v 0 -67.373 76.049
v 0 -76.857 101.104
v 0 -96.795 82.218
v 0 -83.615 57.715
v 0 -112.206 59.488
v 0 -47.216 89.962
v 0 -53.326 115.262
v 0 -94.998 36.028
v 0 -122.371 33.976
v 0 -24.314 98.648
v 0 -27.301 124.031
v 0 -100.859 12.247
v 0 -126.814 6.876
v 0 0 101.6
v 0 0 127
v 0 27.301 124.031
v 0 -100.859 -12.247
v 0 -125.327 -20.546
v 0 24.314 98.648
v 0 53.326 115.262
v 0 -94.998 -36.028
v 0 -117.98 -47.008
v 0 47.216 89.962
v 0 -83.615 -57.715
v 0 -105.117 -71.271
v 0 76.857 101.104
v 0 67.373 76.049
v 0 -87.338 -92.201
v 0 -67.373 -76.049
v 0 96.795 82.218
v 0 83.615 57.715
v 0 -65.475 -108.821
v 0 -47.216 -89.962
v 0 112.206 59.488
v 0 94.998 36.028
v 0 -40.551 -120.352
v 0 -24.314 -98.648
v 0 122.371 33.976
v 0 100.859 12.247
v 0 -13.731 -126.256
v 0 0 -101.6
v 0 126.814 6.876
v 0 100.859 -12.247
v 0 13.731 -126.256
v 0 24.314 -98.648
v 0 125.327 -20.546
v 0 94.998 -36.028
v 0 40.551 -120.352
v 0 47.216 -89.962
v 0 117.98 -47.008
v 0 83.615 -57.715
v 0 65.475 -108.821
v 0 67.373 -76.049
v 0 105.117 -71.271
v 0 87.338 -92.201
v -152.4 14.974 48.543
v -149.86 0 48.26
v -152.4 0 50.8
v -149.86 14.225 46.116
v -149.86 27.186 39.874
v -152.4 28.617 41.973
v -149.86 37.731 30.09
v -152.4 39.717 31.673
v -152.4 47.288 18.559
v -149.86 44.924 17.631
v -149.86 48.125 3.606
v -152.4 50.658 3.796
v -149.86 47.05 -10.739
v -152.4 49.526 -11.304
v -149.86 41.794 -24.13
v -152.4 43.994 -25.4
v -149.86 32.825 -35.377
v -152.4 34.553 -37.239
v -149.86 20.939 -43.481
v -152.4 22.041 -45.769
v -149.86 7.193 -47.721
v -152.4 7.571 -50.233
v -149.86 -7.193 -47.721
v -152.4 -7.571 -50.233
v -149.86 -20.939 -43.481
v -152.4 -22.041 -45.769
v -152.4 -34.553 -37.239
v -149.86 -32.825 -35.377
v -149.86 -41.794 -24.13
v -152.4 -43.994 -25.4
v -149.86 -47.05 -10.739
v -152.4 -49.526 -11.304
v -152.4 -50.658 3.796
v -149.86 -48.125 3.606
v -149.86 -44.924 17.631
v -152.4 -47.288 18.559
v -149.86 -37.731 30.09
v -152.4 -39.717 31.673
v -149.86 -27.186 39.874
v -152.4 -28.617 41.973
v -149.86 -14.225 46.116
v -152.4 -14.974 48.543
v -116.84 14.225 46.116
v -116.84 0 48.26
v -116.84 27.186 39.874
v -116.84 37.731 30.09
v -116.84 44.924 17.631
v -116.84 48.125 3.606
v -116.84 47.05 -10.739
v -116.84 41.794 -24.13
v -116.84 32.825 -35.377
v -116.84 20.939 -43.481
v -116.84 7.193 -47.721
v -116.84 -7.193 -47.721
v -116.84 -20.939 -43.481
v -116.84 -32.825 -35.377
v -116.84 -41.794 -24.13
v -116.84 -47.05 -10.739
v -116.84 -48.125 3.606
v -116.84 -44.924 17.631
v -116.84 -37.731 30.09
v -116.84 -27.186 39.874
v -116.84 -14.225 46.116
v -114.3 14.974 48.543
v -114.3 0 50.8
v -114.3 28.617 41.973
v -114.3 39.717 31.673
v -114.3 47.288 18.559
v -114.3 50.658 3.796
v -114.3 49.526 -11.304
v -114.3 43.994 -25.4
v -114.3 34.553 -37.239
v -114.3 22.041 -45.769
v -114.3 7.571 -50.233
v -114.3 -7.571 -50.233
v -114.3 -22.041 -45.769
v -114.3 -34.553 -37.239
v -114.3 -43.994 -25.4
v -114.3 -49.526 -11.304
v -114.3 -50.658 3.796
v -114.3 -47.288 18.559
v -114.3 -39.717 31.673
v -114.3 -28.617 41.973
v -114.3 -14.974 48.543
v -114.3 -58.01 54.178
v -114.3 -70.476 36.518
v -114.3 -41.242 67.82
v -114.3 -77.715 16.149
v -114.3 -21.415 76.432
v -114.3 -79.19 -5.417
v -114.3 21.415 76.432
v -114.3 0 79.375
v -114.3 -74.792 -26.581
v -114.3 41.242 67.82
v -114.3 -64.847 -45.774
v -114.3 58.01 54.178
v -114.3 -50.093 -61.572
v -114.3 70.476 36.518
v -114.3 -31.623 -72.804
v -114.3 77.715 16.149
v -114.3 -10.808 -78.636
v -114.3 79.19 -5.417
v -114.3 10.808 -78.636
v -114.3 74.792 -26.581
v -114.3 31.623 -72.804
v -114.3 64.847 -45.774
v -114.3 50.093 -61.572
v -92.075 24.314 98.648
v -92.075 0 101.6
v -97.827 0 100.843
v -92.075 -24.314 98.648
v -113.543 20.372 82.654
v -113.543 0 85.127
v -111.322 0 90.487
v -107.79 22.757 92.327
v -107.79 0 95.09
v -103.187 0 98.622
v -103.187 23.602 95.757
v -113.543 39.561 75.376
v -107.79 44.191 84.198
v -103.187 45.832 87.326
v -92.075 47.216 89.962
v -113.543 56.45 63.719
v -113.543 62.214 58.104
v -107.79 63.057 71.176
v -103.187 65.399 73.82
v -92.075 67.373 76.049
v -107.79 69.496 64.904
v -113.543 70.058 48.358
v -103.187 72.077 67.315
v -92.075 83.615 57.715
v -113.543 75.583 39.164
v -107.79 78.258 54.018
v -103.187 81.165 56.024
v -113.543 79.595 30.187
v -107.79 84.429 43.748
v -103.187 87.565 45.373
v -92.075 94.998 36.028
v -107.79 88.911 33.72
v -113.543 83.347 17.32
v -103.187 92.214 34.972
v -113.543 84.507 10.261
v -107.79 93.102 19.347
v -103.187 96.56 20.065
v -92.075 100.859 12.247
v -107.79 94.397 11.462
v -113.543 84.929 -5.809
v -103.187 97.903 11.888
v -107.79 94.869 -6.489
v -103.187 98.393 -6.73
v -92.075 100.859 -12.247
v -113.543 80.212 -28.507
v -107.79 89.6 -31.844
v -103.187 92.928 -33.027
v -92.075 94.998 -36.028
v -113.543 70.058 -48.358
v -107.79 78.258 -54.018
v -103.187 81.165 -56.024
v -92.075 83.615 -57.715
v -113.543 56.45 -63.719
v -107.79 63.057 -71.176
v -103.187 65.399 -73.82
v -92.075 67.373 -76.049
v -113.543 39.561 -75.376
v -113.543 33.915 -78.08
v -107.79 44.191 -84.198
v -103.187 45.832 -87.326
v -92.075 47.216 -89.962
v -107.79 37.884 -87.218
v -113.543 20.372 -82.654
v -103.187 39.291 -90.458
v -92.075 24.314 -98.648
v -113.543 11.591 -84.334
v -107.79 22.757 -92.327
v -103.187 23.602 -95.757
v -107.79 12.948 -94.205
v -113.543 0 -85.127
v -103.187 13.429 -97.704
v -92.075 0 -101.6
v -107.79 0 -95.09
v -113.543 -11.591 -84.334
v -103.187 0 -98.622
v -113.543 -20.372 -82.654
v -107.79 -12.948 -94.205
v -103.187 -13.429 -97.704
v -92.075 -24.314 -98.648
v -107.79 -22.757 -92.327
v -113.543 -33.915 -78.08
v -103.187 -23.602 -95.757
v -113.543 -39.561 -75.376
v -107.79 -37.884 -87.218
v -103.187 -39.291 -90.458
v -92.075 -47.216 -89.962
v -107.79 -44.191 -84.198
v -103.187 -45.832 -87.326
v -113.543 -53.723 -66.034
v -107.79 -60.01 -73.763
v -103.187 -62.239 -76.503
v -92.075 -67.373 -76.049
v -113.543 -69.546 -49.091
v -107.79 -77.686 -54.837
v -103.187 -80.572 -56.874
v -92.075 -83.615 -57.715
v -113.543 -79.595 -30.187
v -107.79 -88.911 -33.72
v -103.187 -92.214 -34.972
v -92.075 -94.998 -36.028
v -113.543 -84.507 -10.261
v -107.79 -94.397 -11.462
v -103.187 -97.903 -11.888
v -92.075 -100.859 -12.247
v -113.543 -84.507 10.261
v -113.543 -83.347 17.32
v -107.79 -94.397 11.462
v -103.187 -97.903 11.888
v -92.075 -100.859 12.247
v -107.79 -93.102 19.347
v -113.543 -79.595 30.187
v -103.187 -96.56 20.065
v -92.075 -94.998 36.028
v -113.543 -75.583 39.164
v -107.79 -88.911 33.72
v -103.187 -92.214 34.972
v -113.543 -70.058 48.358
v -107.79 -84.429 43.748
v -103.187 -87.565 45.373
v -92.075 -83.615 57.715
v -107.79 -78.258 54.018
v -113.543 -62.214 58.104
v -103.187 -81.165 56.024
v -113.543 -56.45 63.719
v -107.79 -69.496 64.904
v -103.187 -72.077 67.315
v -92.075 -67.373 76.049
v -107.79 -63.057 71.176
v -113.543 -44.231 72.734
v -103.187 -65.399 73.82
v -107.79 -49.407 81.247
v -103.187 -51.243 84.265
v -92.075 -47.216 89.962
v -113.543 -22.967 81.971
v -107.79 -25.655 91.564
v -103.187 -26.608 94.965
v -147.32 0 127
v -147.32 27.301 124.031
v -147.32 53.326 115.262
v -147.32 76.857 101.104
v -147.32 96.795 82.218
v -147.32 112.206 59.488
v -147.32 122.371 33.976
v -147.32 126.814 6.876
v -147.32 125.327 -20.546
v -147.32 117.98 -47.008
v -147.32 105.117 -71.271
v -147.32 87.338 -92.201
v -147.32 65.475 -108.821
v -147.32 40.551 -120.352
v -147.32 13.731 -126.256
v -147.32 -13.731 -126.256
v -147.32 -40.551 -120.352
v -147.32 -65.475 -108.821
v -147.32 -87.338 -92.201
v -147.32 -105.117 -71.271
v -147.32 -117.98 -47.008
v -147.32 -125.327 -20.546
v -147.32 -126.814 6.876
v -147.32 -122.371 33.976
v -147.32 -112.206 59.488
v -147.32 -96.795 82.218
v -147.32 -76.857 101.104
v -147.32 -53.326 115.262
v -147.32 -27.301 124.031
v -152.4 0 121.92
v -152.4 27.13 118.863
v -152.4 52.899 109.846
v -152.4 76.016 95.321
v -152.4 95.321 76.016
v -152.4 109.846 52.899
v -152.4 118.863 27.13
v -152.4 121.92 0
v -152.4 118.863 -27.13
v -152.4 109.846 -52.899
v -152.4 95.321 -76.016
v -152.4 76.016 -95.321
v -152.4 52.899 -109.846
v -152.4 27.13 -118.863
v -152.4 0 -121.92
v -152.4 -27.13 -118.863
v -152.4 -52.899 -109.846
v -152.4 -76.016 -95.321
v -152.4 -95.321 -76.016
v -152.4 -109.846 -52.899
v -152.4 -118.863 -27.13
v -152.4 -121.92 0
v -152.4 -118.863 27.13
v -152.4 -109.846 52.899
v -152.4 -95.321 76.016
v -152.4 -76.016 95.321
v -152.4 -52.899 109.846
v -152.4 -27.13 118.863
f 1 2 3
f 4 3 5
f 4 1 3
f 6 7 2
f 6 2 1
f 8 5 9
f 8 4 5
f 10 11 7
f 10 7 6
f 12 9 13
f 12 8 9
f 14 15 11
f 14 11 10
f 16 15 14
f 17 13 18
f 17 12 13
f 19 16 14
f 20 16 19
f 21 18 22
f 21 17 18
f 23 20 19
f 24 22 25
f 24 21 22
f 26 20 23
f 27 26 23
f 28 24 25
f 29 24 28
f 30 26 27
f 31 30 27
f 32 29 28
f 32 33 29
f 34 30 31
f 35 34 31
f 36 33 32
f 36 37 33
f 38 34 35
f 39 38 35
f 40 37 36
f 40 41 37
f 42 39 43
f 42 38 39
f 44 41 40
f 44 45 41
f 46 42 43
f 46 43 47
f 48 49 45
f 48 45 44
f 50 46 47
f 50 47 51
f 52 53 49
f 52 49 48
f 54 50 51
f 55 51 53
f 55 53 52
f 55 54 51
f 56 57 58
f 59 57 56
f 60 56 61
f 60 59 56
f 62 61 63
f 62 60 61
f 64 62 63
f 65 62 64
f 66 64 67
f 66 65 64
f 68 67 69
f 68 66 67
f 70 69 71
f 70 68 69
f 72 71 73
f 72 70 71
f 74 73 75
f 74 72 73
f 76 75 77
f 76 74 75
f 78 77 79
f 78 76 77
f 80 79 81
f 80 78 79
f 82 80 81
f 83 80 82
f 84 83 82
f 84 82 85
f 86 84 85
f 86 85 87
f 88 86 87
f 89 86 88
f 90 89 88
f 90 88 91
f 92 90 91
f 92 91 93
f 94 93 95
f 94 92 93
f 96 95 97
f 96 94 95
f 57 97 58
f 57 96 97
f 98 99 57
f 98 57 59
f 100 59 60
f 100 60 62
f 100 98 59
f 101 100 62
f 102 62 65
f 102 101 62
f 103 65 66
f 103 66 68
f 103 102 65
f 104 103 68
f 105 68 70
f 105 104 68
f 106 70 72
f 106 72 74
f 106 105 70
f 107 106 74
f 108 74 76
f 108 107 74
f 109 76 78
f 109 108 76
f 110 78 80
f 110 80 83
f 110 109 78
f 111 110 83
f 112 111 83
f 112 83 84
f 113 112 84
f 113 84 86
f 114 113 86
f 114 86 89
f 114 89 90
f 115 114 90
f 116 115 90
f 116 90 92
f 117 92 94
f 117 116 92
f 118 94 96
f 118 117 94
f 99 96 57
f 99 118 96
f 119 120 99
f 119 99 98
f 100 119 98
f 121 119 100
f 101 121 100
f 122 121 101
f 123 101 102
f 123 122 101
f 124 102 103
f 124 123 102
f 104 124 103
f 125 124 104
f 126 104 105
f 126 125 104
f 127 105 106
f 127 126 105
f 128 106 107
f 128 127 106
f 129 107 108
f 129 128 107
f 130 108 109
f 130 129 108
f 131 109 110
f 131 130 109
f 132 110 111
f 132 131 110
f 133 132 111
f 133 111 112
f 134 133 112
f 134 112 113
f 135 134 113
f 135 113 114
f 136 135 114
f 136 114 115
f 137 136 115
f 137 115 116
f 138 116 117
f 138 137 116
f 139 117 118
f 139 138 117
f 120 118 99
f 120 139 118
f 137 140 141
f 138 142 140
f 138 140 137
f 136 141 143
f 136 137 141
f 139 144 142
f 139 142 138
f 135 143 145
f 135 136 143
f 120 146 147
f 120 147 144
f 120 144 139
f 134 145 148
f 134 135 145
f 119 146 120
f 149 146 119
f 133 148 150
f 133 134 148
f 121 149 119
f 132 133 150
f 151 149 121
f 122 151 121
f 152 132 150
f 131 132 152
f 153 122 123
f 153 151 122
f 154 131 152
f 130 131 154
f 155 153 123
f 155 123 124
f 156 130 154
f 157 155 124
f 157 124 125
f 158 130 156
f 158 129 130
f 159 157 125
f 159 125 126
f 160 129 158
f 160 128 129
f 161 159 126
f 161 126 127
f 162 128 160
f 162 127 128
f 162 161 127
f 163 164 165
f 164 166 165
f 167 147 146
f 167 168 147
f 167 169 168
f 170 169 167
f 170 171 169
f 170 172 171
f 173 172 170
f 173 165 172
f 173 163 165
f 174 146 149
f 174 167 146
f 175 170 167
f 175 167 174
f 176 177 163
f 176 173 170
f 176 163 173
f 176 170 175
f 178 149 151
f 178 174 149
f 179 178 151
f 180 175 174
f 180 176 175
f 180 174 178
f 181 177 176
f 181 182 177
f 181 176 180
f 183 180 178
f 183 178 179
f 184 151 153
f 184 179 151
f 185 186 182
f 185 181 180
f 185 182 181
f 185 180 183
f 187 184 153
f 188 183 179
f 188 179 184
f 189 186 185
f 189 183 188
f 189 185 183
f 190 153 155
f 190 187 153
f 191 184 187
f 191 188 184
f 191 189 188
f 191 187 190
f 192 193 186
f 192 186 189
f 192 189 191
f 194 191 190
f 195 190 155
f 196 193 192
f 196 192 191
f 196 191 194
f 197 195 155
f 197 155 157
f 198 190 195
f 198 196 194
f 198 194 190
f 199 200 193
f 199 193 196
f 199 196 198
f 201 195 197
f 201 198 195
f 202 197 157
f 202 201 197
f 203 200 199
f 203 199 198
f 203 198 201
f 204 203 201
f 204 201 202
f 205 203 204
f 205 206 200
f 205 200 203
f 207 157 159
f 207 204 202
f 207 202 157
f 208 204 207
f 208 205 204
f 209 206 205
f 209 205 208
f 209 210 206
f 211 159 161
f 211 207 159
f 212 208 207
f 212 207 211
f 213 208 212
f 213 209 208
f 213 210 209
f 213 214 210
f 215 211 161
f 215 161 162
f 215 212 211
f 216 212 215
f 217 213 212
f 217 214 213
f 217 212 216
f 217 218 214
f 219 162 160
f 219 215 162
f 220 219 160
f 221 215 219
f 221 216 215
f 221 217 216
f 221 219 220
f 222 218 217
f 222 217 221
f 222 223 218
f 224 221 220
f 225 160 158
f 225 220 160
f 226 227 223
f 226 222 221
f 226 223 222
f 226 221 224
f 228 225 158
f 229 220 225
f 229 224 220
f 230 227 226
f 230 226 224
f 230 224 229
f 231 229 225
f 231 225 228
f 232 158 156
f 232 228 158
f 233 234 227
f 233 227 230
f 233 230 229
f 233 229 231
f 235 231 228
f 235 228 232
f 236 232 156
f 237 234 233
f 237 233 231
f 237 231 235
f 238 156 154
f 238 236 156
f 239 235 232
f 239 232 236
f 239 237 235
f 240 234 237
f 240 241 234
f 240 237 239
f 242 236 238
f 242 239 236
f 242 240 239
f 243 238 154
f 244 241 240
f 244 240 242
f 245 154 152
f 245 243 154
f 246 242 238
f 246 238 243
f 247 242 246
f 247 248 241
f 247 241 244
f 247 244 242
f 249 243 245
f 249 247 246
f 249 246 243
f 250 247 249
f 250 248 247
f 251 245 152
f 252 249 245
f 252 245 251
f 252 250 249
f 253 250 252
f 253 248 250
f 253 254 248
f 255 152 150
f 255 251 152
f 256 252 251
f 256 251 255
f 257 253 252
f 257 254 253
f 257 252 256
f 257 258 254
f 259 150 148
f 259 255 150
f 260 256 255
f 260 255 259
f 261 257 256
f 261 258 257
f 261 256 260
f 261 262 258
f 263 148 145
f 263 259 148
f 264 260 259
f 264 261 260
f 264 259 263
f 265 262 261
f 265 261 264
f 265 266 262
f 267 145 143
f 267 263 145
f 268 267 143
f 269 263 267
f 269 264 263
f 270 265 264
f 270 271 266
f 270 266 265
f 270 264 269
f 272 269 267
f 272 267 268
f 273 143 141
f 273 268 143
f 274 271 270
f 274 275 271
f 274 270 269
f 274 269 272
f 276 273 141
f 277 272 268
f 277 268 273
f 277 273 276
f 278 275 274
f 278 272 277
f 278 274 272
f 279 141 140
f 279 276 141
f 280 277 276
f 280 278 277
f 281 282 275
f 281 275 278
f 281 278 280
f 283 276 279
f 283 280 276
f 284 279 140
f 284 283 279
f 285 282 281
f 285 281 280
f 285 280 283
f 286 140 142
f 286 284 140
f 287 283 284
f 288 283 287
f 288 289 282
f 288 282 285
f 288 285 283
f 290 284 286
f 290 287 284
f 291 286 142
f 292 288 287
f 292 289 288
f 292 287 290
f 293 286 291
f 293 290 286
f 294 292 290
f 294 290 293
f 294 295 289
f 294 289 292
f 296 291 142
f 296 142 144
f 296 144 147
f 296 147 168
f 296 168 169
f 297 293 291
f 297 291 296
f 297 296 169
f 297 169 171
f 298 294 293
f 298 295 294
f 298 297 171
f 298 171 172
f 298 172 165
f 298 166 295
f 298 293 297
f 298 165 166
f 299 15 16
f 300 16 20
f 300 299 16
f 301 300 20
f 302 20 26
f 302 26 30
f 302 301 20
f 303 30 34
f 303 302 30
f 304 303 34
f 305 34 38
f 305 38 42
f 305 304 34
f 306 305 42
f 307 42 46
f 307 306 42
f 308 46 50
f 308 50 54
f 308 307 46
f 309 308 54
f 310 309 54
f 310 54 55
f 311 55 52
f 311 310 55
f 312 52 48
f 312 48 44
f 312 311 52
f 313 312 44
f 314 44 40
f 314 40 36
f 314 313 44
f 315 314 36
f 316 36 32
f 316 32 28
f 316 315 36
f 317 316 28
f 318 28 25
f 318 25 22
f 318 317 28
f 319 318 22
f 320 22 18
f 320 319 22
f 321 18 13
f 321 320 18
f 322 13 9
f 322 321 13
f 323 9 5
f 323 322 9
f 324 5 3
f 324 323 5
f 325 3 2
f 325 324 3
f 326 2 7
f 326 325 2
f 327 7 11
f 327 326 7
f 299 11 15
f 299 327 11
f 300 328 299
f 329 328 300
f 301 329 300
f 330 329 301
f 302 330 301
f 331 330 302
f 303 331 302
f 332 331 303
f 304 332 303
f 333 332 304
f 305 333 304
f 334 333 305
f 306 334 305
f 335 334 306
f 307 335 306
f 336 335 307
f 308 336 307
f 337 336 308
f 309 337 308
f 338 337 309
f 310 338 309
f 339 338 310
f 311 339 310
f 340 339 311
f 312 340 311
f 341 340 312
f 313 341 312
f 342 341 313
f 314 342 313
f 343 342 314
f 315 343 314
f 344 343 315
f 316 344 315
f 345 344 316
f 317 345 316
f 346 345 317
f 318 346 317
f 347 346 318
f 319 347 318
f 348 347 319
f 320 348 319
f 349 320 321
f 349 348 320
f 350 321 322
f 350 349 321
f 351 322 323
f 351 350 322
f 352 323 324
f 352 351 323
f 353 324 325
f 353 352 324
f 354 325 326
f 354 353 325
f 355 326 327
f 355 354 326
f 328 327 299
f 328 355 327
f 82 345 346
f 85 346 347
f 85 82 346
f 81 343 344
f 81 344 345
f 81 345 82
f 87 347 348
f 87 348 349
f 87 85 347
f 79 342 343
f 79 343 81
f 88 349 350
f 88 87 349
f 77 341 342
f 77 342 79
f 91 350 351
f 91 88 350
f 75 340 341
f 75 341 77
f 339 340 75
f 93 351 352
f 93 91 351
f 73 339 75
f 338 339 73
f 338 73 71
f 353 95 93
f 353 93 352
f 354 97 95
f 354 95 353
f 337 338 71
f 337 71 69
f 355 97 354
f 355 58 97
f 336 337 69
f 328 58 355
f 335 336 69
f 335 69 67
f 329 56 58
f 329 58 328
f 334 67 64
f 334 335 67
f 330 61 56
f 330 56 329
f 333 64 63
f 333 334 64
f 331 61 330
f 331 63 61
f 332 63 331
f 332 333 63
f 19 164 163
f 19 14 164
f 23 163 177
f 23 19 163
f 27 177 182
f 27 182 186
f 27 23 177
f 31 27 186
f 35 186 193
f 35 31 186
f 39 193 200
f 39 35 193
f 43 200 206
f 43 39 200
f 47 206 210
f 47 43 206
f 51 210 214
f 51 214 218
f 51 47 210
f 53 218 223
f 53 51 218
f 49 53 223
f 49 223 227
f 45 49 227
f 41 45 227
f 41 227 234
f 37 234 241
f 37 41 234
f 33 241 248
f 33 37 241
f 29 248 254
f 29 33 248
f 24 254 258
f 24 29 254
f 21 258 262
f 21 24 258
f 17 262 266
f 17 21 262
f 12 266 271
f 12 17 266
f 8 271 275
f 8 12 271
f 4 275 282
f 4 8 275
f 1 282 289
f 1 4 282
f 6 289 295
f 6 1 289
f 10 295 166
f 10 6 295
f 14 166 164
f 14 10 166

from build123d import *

# Parameters (mm, degrees)
F2_SIZE = 5.08
F3_SIZE = 2.54


with BuildPart() as f1:
    # F0 (on Front) → F1 (revolve)
    with BuildSketch(Plane.XZ):
        with BuildLine():
            Line((0, 101.6), (0, 127))
            Line((0, 127), (-152.4, 127))
            Line((-152.4, 127), (-152.4, 48.26))
            Line((-152.4, 48.26), (-114.3, 48.26))
            Line((-114.3, 48.26), (-114.3, 79.375))
            ThreePointArc((-114.3, 79.375), (-107.790448, 95.090448), (-92.075, 101.6))
            Line((-92.075, 101.6), (0, 101.6))
        make_face()
    revolve(axis=Axis((-71.717651, 0, 0), (-1, 0, 0)))

    # F2
    f2_edges = [f1.edges().sort_by_distance(p)[0] for p in [
        (-152.4, 0, -127),
    ]]
    chamfer(f2_edges, length=F2_SIZE)

    # F3
    f3_edges = [f1.edges().sort_by_distance(p)[0] for p in [
        (-152.4, 0, -48.26),
        (-114.3, 0, -48.26),
        (-133.35, 0, 48.26),
    ]]
    chamfer(f3_edges, length=F3_SIZE)


solid = f1.part
